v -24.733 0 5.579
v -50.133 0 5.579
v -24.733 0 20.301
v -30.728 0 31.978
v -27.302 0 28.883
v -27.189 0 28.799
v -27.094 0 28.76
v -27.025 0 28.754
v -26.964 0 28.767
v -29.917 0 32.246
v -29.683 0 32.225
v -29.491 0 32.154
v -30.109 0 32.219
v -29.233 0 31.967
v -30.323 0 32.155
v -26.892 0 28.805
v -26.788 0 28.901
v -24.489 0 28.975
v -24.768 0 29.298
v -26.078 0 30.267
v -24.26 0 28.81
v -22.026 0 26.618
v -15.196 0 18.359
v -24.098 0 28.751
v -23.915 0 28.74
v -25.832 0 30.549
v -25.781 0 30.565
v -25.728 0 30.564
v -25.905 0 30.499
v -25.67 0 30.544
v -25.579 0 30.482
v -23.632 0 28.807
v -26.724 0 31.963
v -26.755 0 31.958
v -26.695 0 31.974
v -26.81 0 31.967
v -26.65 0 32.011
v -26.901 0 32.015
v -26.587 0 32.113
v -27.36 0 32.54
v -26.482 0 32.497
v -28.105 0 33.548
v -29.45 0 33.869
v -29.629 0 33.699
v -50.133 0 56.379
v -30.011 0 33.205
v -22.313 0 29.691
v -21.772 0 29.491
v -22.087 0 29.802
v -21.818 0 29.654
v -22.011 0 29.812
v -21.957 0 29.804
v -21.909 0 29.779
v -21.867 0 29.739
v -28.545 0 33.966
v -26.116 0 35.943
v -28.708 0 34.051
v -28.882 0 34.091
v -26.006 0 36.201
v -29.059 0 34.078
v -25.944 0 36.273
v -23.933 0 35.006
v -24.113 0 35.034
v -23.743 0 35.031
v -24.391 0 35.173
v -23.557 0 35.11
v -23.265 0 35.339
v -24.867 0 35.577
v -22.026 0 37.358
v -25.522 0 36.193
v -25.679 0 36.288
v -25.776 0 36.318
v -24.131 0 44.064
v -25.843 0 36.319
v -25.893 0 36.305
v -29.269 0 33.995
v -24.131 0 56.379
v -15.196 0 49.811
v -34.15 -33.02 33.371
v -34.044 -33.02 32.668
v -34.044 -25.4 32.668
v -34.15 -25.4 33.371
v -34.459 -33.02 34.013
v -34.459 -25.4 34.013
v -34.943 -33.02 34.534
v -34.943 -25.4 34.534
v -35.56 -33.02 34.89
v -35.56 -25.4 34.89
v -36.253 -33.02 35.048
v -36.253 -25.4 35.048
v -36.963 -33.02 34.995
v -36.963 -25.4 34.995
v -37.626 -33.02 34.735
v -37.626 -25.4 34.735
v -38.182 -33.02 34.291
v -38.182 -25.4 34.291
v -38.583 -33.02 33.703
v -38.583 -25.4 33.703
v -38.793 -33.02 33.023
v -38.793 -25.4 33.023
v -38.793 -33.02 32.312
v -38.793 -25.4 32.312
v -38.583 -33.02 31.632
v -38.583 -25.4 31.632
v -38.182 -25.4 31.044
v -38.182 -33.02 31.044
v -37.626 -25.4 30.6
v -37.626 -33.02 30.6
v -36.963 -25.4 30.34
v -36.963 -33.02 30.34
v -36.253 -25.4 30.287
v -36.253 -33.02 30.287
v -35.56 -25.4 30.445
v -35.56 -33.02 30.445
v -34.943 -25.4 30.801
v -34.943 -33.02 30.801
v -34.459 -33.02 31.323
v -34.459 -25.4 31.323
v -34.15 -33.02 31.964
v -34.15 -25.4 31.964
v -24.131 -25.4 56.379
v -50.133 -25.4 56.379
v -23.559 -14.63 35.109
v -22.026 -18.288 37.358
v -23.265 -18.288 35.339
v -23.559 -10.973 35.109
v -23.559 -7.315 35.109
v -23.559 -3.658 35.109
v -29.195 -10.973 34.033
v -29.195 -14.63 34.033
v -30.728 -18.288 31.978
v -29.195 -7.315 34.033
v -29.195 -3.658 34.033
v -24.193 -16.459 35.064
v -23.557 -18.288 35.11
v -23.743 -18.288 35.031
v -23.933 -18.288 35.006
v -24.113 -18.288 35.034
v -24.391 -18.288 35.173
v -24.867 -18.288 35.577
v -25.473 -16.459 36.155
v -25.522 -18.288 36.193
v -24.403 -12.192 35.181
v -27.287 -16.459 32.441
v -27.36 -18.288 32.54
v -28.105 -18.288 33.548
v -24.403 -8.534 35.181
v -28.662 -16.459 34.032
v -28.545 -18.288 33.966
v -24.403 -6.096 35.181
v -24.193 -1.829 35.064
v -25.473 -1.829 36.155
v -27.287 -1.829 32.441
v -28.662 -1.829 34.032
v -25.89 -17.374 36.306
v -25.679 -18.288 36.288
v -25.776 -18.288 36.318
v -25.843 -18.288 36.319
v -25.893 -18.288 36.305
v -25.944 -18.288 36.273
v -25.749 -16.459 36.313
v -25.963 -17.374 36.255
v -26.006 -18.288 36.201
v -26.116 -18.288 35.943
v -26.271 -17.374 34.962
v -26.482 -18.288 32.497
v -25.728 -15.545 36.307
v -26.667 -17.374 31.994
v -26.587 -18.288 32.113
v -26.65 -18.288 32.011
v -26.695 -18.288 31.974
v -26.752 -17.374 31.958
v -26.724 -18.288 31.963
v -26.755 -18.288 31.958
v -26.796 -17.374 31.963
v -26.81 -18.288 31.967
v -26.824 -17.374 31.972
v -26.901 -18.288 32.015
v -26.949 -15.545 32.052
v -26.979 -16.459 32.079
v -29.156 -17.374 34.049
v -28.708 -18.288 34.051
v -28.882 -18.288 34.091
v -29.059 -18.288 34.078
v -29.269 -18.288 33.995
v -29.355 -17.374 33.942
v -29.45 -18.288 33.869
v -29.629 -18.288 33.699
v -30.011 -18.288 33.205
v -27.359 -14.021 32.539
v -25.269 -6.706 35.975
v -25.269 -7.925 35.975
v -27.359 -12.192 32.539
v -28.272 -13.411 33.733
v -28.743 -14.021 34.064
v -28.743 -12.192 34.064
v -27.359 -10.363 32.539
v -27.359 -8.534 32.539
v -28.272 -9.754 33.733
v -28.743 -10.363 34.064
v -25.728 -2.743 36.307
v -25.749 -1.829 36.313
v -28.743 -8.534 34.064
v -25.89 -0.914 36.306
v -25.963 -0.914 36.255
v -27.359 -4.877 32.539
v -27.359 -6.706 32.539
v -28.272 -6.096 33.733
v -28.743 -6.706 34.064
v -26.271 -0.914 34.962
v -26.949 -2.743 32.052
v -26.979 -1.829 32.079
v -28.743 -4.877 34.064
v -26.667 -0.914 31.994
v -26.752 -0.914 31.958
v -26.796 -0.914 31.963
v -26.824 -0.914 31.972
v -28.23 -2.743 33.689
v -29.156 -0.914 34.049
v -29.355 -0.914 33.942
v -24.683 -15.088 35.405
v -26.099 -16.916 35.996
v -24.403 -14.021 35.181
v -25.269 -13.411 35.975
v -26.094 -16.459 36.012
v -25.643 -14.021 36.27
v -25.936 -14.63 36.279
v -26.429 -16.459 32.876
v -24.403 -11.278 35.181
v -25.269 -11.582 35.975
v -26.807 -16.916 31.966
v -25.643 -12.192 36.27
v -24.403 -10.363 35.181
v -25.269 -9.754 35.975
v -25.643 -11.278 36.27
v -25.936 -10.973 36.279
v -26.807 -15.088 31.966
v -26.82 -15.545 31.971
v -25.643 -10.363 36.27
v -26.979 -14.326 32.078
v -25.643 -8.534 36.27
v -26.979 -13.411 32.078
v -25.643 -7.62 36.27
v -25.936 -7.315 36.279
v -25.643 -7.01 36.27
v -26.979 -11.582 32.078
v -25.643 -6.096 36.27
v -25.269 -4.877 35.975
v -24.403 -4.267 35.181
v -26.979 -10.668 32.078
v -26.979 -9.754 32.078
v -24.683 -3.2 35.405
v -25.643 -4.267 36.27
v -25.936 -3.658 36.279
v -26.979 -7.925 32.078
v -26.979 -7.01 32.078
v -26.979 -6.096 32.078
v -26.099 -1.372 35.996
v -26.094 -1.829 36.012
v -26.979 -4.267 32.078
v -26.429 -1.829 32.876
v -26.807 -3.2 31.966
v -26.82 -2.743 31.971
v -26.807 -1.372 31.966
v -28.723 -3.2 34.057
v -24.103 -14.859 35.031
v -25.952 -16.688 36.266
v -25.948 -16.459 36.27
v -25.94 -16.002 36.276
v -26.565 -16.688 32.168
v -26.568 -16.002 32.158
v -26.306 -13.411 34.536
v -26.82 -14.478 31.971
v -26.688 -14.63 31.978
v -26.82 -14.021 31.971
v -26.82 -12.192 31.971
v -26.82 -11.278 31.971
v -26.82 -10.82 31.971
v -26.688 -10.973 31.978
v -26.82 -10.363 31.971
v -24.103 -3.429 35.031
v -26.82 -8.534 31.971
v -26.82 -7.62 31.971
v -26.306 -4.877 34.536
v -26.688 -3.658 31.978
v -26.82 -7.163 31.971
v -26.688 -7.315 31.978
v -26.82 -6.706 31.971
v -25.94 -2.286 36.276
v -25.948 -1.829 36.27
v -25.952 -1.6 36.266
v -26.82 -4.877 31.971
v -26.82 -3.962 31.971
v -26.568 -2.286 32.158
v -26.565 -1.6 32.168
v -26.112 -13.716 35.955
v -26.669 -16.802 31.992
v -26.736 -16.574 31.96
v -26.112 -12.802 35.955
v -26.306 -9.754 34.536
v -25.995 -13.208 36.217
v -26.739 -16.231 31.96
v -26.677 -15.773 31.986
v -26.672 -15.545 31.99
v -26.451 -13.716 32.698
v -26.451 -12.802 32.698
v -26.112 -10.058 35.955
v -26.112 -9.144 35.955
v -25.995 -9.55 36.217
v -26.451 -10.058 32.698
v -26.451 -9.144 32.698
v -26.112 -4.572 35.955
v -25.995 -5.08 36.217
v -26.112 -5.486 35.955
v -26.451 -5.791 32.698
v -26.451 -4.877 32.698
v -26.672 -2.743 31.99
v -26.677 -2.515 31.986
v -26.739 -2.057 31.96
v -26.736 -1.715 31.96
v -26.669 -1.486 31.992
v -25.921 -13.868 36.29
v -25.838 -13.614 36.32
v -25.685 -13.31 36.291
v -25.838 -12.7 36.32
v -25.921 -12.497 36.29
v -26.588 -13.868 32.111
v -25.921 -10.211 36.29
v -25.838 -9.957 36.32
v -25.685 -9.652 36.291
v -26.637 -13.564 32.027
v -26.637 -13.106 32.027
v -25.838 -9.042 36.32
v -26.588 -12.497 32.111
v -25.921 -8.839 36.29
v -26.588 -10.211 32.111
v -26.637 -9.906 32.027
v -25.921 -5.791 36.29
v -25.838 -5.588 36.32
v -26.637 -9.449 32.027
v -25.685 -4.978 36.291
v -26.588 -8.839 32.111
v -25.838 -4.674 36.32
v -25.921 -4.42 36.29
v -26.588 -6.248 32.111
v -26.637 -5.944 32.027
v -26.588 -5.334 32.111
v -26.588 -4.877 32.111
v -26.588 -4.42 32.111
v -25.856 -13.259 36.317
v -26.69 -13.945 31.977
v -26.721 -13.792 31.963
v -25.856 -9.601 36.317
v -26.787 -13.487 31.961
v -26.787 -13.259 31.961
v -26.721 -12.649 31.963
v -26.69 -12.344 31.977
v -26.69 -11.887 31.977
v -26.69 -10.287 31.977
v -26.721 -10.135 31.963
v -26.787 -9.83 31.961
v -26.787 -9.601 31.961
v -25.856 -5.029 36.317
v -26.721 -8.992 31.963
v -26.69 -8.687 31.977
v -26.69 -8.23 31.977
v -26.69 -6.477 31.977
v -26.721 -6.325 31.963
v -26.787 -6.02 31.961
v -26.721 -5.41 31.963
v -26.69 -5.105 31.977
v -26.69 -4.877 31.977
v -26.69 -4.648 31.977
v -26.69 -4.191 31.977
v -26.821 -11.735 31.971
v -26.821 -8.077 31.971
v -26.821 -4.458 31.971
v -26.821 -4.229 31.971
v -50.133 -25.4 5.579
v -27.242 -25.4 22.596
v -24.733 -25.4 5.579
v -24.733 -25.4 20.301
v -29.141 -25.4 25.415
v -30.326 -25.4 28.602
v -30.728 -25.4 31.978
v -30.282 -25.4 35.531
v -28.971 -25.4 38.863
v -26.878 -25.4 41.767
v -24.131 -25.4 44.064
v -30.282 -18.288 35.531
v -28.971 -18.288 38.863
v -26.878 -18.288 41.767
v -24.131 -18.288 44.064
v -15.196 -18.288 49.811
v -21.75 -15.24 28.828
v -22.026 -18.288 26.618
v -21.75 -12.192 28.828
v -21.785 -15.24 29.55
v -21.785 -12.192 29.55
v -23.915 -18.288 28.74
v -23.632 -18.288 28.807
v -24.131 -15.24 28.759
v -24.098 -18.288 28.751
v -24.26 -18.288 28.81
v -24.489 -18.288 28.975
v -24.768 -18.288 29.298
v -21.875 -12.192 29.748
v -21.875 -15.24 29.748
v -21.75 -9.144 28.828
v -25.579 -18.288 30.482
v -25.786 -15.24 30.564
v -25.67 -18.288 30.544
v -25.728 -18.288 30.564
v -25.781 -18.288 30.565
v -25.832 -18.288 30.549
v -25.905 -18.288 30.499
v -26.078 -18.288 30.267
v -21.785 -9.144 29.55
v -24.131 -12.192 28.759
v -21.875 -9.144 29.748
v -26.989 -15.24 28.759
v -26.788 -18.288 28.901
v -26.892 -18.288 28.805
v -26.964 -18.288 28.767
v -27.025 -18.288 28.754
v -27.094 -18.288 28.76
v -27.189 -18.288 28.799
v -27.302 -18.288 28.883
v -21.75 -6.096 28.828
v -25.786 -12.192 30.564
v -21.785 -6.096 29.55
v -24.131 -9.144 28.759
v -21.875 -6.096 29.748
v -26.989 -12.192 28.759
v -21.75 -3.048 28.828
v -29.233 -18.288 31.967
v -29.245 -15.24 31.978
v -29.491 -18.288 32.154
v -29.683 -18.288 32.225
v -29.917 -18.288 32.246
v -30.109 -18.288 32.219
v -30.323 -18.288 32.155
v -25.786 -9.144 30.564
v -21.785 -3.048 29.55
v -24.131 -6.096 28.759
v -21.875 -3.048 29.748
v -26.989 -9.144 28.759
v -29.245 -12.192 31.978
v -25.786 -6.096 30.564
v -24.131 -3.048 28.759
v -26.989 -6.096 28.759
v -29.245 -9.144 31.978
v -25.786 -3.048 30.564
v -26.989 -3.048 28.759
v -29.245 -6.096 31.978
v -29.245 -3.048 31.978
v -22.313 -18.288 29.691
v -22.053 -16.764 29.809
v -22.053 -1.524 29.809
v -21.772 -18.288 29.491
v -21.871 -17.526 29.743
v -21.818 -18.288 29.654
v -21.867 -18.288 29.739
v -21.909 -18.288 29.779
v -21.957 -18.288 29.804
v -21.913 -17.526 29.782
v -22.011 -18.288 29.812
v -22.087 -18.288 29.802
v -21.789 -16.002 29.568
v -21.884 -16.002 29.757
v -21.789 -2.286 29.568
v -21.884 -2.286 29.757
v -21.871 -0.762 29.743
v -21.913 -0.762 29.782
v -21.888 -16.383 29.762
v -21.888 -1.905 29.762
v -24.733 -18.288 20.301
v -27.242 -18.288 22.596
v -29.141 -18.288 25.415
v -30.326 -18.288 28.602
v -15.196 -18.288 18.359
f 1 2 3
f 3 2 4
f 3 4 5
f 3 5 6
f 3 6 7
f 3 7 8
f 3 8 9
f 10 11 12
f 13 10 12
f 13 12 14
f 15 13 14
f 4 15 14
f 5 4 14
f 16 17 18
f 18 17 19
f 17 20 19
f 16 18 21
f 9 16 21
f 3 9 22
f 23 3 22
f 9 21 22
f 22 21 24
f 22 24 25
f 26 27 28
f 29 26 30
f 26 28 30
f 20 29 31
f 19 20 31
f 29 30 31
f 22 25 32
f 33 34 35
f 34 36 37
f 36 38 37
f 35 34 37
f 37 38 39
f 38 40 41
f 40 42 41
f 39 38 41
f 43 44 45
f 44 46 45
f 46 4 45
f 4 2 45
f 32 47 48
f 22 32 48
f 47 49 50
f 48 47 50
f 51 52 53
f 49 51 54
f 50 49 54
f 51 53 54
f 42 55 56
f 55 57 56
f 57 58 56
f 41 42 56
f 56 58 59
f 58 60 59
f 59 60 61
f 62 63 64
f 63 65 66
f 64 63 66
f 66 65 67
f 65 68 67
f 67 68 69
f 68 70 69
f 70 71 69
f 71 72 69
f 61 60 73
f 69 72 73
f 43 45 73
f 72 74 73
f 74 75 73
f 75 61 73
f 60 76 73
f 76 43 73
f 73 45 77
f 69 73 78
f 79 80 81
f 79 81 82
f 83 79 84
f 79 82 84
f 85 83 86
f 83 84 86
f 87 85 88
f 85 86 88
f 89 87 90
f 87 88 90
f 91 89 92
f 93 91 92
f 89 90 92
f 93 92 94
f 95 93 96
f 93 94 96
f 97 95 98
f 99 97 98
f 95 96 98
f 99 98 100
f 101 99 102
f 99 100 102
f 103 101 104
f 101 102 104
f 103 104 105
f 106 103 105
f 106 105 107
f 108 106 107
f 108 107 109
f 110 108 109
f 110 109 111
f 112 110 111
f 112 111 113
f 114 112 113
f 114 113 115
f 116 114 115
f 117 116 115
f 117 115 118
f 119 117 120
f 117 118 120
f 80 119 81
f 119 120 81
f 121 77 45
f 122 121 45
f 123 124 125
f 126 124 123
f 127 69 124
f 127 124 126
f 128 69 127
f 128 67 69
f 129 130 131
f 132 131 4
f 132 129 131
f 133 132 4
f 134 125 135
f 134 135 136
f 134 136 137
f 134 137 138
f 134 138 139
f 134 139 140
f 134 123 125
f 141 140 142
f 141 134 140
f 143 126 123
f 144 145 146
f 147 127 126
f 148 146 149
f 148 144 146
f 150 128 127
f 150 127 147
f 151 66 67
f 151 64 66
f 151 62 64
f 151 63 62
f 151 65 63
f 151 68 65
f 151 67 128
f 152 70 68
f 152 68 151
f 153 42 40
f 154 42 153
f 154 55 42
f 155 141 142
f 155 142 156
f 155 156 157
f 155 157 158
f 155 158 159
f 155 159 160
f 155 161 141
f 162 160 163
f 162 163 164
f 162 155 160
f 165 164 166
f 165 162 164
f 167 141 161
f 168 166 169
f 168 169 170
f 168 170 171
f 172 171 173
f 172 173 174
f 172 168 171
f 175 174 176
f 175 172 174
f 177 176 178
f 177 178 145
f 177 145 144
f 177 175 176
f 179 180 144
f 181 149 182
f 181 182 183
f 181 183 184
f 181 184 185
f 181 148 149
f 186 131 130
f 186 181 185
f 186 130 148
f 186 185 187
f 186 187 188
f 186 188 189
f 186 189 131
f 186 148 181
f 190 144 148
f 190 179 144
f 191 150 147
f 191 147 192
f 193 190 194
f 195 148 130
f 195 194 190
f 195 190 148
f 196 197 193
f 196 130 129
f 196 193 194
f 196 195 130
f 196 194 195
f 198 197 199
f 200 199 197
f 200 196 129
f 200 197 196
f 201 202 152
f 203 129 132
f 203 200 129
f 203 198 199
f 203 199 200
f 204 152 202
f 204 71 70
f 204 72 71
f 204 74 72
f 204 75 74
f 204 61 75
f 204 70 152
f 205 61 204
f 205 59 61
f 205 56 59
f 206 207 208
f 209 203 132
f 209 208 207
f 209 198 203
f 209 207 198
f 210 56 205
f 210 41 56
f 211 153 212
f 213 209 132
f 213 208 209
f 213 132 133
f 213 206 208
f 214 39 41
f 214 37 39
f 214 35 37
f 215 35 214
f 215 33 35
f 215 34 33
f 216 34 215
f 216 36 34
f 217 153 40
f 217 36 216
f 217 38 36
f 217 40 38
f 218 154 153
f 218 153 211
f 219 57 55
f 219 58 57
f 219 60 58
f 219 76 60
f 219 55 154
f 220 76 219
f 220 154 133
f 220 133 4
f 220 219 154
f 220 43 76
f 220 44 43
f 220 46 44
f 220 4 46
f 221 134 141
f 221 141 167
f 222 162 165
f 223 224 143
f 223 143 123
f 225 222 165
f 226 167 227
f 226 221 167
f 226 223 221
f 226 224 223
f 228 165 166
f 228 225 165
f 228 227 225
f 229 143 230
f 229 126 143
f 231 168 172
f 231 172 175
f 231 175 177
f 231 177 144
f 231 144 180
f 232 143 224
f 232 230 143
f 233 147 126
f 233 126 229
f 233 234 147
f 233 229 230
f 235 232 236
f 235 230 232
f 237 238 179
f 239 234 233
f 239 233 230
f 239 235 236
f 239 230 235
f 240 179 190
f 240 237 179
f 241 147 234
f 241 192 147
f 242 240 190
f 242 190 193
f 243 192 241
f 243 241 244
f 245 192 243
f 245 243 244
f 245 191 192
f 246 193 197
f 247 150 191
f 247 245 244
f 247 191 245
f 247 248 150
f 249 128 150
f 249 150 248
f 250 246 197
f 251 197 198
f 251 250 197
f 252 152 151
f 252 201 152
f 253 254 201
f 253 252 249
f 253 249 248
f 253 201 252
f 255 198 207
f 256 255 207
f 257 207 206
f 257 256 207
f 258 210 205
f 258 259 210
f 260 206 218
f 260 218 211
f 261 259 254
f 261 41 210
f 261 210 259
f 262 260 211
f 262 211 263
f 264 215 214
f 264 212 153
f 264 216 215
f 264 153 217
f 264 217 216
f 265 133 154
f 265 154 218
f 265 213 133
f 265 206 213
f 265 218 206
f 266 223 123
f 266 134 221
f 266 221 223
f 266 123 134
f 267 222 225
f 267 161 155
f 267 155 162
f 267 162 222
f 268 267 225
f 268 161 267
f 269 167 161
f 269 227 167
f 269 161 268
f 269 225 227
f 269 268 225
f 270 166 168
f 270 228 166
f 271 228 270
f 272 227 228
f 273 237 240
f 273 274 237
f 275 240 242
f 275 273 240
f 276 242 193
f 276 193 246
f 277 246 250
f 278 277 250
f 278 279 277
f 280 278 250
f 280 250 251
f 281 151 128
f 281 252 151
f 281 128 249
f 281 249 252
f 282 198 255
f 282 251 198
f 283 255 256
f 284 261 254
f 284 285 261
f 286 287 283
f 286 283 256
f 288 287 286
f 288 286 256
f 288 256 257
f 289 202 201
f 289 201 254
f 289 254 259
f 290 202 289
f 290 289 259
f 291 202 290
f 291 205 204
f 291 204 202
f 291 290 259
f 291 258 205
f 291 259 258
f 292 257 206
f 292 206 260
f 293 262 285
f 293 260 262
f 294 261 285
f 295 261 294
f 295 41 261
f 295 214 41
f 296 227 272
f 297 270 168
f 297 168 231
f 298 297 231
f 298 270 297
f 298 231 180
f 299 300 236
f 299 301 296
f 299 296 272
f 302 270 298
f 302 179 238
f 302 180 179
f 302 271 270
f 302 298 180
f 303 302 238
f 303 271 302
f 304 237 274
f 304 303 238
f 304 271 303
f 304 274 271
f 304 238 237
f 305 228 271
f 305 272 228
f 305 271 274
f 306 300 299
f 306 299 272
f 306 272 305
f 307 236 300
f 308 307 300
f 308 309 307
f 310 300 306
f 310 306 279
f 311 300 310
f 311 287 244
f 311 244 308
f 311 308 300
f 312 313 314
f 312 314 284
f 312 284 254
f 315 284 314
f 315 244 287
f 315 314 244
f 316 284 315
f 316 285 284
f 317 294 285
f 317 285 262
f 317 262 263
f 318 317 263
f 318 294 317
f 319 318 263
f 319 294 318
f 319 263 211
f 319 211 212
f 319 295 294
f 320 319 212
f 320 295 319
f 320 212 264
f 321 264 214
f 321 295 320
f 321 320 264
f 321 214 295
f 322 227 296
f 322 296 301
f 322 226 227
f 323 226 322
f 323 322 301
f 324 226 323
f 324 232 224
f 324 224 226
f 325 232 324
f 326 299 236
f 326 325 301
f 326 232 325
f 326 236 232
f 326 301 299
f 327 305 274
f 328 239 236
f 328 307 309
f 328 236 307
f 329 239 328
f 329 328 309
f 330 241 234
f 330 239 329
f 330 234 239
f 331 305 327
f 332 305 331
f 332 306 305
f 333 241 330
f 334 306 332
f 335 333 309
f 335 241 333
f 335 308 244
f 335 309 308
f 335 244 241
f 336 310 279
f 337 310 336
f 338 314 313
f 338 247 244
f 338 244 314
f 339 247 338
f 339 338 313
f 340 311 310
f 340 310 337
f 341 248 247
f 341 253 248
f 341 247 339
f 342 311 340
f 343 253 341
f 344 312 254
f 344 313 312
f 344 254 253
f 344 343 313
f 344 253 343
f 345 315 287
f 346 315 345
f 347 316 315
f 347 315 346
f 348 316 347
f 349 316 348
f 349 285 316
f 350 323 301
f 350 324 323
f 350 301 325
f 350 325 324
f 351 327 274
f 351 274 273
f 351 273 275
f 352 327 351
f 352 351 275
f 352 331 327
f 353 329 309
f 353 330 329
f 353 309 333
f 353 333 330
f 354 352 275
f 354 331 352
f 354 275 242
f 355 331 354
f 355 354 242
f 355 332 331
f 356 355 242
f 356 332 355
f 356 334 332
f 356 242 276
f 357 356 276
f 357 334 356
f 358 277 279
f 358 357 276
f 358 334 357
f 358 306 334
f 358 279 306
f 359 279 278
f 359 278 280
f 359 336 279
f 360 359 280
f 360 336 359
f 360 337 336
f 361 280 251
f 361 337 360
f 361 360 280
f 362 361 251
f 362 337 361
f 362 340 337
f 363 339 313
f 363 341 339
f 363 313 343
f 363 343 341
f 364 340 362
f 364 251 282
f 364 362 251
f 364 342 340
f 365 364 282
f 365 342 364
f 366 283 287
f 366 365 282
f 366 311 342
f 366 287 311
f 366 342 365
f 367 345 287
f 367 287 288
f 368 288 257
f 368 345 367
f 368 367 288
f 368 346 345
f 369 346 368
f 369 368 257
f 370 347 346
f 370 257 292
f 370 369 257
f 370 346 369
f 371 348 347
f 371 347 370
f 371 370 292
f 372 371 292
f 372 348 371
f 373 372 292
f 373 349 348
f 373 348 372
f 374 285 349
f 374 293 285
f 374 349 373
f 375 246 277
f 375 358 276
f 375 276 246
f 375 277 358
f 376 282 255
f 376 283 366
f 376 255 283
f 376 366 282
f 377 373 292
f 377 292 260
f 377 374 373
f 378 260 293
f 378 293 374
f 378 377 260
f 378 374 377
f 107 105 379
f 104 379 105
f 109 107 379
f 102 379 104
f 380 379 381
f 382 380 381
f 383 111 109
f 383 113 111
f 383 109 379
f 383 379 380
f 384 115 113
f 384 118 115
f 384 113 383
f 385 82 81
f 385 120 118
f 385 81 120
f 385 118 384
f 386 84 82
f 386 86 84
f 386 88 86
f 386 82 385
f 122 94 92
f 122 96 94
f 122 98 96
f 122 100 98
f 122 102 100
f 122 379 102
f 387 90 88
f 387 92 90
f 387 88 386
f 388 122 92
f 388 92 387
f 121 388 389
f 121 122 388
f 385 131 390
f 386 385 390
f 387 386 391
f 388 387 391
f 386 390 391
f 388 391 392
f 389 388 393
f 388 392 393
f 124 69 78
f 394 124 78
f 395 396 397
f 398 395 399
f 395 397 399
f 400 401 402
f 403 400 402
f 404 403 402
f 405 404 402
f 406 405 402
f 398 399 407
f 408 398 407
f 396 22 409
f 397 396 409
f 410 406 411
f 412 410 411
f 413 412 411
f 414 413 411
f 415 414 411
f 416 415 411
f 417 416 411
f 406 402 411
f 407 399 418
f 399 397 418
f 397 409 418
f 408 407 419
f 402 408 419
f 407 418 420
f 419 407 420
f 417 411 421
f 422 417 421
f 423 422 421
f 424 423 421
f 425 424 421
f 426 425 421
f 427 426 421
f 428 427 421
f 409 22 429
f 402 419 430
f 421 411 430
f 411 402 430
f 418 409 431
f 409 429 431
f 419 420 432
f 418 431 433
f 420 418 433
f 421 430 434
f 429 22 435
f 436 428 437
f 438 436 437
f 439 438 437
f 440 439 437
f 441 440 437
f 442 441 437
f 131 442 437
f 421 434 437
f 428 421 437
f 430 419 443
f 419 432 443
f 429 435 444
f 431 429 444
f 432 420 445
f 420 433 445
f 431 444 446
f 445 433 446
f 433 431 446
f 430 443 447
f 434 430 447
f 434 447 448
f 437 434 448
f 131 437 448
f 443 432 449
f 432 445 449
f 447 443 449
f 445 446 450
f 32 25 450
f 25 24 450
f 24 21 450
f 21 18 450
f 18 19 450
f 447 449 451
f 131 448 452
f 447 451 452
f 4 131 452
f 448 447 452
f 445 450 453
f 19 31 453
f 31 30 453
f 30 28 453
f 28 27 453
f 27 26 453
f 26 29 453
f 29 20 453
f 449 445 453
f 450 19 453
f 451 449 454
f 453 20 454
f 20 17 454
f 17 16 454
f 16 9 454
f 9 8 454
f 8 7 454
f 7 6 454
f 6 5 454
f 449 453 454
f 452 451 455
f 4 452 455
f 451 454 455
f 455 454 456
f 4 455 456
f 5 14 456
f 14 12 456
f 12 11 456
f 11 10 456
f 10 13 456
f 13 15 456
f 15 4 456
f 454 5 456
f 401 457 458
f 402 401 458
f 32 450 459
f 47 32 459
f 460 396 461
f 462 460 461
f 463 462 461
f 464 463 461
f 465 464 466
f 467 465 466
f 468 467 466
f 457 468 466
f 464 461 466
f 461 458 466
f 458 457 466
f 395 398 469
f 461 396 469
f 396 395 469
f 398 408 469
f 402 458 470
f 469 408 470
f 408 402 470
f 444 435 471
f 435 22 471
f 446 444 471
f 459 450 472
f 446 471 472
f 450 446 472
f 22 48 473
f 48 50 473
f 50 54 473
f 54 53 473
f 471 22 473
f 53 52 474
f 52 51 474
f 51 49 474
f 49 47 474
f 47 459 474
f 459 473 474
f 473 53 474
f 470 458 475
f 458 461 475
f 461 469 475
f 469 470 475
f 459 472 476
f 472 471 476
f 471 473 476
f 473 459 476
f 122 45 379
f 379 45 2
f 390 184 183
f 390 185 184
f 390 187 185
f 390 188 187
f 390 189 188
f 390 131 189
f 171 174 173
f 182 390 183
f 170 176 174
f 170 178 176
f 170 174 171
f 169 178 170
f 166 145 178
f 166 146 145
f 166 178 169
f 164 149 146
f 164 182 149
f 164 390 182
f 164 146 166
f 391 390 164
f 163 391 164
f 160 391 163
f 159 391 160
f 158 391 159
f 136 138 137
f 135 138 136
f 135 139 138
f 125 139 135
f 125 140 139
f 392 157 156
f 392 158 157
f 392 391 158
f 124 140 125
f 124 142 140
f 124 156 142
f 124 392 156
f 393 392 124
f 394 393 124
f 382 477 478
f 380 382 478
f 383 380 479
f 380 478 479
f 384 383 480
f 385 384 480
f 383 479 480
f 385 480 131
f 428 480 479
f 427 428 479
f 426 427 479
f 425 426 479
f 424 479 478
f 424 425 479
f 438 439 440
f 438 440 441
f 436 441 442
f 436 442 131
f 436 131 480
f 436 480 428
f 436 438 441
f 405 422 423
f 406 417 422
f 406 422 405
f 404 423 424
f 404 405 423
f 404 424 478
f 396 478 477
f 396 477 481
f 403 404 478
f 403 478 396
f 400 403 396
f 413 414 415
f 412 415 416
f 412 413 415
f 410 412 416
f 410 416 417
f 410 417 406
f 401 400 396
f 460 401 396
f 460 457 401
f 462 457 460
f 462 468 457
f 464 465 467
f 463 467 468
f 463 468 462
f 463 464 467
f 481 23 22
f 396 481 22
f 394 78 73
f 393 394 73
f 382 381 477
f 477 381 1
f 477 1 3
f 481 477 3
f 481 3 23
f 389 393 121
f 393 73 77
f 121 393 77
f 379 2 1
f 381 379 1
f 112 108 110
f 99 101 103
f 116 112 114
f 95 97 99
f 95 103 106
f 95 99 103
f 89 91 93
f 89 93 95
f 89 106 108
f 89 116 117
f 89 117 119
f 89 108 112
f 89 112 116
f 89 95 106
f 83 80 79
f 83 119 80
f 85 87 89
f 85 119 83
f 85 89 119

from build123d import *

# Parameters (mm, degrees)
F1_DEPTH = 25.4
F2_DEPTH = 18.288
F3_R     = 2.3874235121
F4_DEPTH = 7.62


with BuildPart() as f1:
    # F0 (on Front) → F1 (new body)
    with BuildSketch(Plane.XZ):
        with BuildLine():
            Line((-24.131346494, 56.3794554487), (-50.132939899, 56.3794554487))
            Line((-50.132939899, 56.3794554487), (-50.132939899, 5.5794554487))
            Line((-50.132939899, 5.5794554487), (-24.732939899, 5.5794554487))
            Line((-24.732939899, 5.5794554487), (-24.732939899, 20.3011780977))
            ThreePointArc((-24.732939899, 20.3011780977), (-29.1414600938, 25.4152489382), (-30.7276976446, 31.9782224489))
            ThreePointArc((-30.7276976446, 31.9782224489), (-28.9712672239, 38.862632279), (-24.131346494, 44.064104557))
            Line((-24.131346494, 44.064104557), (-24.131346494, 56.3794554487))
        make_face()
    extrude(amount=F1_DEPTH)

    # F0 (on Front) → F2 (join)
    with BuildSketch(Plane.XZ):
        with BuildLine():
            Line((-24.131346494, 56.3794554487), (-50.132939899, 56.3794554487))
            Line((-50.132939899, 56.3794554487), (-50.132939899, 5.5794554487))
            Line((-50.132939899, 5.5794554487), (-24.732939899, 5.5794554487))
            Line((-24.732939899, 5.5794554487), (-24.732939899, 20.3011780977))
            ThreePointArc((-24.732939899, 20.3011780977), (-29.1414600938, 25.4152489382), (-30.7276976446, 31.9782224489))
            ThreePointArc((-30.7276976446, 31.9782224489), (-28.9712672239, 38.862632279), (-24.131346494, 44.064104557))
            Line((-24.131346494, 44.064104557), (-24.131346494, 56.3794554487))
        make_face()
        with BuildLine():
            Line((-15.1963783757, 49.8111538198), (-24.131346494, 44.064104557))
            ThreePointArc((-24.131346494, 44.064104557), (-28.9712672239, 38.862632279), (-30.7276976446, 31.9782224489))
            add(Edge.make_bspline(
                [(-22.0257714391, 37.3575530945), (-22.6806760296, 36.0666983976), (-23.8831849752, 33.6964839524), (-26.6393946432, 38.4174636178), (-26.0256427545, 29.3723486265), (-28.7467670812, 35.5916543326), (-30.0639202898, 33.1890242316), (-30.7276976446, 31.9782224489)],
                knots=[0, 0, 0, 0, 0.2027027665, 0.3721945052, 0.6115618889, 0.8042472051, 1, 1, 1, 1], degree=3))
            Line((-22.0257714391, 37.3575530945), (-15.1963783757, 49.8111538198))
        make_face()
        with BuildLine():
            ThreePointArc((-30.7276976446, 31.9782224489), (-29.1414600938, 25.4152489382), (-24.732939899, 20.3011780977))
            Line((-24.732939899, 20.3011780977), (-15.1963783757, 18.3593296999))
            Line((-15.1963783757, 18.3593296999), (-22.0257714391, 26.617905125))
            add(Edge.make_bspline(
                [(-22.0257714391, 26.617905125), (-21.7809687928, 28.2276969891), (-21.3260047871, 31.2194839083), (-24.3883231118, 27.3117695941), (-25.821635029, 32.2207693678), (-26.9923703045, 26.6778642305), (-28.9416028698, 32.8219648717), (-30.2354115507, 32.2107759883), (-30.7276976446, 31.9782224489)],
                knots=[0, 0, 0, 0, 0.1869598057, 0.3474634911, 0.5111471046, 0.6652140281, 0.872616036, 1, 1, 1, 1], degree=3))
        make_face()
    extrude(amount=F2_DEPTH)

    # F3 (on face) → F4 (join)
    with BuildSketch(Plane.XZ.offset(25.4)):
        with Locations((-36.4318527281, 32.6676182449)):
            Circle(F3_R)
    extrude(amount=F4_DEPTH)


solid = f1.part
